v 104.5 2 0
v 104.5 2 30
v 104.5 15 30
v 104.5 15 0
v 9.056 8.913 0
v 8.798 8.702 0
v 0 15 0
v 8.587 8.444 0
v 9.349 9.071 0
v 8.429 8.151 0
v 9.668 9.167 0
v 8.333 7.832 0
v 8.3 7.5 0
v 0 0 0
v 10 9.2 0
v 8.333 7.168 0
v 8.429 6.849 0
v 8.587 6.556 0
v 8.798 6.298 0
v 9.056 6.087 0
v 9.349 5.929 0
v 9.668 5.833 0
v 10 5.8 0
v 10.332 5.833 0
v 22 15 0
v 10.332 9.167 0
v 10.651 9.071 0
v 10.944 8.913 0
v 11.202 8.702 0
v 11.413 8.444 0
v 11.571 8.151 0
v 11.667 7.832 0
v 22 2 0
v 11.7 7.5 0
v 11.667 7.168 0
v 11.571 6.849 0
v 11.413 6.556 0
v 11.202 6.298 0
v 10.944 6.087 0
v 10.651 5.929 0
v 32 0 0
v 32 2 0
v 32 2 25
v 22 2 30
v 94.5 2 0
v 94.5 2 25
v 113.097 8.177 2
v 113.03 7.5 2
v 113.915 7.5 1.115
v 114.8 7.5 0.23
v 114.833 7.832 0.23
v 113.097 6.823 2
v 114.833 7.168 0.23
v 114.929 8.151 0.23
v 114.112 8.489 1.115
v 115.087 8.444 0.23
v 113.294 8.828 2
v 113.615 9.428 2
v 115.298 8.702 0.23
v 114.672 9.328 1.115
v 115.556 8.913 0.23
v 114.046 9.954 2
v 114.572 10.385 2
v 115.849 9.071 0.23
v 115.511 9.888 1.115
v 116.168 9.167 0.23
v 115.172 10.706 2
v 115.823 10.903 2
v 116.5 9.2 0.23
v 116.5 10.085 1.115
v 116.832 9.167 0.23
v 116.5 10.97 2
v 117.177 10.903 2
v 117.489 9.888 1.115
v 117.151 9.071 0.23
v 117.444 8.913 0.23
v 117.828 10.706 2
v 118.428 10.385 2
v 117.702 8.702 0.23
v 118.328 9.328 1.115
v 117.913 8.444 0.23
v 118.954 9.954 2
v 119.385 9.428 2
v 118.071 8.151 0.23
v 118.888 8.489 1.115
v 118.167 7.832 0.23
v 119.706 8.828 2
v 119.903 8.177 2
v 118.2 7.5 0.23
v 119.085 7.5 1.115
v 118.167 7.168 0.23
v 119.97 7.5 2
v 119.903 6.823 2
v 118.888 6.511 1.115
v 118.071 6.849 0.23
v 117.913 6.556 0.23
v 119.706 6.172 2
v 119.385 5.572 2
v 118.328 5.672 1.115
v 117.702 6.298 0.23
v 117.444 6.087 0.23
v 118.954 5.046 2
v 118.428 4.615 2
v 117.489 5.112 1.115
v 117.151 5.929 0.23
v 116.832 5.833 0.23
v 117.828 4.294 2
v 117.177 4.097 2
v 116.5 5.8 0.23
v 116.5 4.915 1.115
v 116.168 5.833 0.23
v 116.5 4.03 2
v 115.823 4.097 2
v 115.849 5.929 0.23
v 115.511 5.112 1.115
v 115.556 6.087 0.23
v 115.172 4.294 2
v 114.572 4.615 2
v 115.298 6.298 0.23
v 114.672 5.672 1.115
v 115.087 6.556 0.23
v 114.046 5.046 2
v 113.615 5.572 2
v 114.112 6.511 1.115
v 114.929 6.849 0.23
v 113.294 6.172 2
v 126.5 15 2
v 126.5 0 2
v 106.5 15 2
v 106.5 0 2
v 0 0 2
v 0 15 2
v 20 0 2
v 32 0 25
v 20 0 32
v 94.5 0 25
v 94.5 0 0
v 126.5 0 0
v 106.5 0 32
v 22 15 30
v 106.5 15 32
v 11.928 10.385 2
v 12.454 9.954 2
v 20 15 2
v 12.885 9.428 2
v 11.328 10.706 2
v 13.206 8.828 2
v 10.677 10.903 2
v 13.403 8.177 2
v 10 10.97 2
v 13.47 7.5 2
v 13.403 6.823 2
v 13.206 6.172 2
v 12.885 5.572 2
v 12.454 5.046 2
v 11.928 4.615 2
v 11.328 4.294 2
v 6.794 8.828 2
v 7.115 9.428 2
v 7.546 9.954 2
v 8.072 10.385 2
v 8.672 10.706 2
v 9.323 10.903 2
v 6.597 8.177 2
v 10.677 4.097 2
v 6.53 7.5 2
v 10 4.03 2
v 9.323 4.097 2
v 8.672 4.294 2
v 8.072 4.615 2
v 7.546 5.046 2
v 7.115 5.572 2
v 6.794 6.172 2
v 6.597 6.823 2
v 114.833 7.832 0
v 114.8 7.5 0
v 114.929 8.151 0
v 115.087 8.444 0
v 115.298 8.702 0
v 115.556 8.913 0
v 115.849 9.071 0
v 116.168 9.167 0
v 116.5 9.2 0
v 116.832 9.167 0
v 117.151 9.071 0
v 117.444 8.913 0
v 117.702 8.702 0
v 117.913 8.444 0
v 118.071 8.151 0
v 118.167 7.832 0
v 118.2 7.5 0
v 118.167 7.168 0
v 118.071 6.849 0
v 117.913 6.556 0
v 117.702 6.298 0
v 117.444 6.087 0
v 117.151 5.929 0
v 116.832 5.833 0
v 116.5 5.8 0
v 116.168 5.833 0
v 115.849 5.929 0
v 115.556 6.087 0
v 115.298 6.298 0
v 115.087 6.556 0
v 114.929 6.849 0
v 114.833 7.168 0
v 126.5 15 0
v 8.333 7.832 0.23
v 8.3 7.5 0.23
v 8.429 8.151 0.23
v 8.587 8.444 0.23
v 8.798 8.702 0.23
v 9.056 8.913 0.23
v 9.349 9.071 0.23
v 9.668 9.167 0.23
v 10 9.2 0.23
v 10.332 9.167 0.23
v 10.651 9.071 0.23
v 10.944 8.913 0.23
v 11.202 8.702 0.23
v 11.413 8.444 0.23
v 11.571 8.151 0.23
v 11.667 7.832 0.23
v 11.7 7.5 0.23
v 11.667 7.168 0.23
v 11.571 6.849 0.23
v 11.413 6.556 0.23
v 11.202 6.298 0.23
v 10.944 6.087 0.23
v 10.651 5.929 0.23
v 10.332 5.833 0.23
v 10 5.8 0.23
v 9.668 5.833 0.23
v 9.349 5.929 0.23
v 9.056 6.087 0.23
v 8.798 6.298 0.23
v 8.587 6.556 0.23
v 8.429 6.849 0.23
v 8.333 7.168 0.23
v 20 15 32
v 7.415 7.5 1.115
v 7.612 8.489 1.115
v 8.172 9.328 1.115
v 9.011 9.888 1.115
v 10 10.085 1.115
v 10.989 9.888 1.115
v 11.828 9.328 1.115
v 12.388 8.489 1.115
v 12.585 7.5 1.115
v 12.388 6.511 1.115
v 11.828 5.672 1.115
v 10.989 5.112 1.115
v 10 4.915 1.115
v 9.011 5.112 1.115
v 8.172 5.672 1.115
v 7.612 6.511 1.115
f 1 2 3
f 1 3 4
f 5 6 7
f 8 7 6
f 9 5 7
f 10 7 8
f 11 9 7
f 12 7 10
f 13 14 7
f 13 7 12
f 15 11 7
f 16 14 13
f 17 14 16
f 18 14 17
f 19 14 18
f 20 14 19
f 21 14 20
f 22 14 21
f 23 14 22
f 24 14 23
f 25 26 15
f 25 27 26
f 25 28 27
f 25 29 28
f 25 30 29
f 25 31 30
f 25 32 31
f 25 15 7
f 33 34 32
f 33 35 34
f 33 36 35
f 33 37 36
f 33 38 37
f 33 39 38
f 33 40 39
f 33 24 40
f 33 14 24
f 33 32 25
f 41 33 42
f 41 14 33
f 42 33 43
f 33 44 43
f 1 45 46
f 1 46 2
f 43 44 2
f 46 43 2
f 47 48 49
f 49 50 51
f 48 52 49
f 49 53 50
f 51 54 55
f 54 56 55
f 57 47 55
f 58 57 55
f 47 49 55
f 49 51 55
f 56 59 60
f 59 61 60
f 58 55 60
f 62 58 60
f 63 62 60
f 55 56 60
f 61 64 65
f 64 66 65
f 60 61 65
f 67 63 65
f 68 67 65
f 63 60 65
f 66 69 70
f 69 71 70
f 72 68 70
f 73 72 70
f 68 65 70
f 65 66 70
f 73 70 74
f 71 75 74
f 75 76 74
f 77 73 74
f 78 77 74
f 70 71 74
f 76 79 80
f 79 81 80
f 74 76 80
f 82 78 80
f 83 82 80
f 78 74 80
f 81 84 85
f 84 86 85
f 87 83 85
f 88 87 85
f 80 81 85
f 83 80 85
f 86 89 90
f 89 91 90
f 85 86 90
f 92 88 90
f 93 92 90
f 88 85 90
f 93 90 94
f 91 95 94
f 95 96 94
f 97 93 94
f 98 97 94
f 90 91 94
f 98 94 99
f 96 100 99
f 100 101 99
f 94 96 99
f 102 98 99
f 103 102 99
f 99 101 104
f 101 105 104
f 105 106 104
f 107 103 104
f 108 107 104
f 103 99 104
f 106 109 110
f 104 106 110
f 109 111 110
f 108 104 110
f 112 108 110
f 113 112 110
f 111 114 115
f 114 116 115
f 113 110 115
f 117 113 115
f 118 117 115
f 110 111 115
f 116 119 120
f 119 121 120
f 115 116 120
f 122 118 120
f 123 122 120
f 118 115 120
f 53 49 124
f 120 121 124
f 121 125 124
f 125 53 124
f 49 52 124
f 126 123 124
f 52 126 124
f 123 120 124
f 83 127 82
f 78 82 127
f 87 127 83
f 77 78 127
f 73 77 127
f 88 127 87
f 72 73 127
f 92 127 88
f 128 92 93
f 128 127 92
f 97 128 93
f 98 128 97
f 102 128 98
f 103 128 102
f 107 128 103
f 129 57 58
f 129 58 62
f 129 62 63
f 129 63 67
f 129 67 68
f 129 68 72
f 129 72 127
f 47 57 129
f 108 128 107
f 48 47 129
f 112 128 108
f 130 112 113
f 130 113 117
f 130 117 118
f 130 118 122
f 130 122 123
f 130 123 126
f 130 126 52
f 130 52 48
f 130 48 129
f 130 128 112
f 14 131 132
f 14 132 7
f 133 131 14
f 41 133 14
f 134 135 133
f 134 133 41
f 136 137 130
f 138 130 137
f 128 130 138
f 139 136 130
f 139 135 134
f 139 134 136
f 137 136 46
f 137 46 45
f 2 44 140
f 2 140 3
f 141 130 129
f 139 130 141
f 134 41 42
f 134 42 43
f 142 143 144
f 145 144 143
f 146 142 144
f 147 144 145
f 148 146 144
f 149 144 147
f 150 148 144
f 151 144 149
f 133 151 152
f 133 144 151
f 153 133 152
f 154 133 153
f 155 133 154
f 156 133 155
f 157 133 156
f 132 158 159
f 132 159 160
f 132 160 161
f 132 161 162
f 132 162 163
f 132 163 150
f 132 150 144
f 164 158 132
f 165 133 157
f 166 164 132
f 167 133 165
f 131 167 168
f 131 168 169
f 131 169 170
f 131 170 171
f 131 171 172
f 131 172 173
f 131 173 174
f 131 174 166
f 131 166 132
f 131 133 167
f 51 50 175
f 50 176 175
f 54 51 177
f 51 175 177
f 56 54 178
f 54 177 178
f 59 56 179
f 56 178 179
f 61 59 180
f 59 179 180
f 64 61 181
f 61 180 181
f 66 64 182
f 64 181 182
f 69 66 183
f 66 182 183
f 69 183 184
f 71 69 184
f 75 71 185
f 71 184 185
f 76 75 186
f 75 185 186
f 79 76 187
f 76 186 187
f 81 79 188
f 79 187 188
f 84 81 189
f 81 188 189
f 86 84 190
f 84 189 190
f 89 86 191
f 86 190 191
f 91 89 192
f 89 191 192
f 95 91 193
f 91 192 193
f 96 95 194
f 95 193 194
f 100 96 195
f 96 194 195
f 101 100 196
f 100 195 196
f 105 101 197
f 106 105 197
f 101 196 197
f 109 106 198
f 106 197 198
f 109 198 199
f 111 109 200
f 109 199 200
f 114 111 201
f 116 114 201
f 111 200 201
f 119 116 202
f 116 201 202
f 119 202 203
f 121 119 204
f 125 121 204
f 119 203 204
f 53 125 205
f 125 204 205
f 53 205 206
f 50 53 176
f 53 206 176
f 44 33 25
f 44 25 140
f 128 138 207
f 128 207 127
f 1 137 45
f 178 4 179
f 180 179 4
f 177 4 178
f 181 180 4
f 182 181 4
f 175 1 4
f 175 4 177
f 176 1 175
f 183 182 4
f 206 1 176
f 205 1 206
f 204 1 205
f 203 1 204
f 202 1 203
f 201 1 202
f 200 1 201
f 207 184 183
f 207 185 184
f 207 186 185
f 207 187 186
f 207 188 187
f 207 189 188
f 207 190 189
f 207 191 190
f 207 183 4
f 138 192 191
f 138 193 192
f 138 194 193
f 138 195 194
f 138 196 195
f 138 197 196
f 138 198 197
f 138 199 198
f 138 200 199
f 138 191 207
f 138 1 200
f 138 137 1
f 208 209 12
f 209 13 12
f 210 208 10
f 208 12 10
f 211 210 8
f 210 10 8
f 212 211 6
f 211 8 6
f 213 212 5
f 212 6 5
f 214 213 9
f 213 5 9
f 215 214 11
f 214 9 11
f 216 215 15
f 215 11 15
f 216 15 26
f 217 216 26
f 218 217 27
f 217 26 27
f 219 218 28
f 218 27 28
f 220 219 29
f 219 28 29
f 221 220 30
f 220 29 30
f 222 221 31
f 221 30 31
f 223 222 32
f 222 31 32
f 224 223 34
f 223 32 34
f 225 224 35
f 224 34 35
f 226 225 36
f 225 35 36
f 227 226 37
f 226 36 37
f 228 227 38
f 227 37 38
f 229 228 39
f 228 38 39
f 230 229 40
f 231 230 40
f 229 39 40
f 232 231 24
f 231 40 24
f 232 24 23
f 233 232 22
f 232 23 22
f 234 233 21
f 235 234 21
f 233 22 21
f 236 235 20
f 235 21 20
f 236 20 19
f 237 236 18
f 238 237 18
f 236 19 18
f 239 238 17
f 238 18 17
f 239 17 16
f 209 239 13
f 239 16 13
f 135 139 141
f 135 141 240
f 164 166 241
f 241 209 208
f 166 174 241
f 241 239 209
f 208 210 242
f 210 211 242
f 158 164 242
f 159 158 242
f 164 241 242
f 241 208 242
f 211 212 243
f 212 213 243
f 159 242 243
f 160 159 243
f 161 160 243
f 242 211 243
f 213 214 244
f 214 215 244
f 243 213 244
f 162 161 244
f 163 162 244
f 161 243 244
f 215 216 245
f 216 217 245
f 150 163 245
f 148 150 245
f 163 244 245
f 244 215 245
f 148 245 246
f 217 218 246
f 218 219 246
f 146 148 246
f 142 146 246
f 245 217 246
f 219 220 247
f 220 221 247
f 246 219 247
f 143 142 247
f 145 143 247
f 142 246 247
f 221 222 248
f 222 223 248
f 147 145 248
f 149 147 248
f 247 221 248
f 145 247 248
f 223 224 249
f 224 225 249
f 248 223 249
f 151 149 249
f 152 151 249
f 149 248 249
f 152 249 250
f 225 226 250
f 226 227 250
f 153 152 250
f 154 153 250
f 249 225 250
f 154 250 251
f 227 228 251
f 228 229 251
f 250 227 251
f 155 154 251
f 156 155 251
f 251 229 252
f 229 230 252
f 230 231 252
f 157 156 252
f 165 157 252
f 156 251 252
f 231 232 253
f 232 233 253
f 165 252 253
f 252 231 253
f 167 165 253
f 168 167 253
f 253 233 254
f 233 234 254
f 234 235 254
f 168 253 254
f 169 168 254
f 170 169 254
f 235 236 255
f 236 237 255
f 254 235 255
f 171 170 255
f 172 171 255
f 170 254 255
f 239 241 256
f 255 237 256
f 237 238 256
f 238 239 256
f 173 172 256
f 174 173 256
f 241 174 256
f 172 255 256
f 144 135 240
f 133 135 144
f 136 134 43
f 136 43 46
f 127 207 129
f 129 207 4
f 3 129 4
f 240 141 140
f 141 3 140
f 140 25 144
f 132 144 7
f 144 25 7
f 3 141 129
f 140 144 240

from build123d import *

# Parameters (mm, degrees)
AUFSATZ_LINEAR_AUSTRAGEN1_DEPTH                      = 15
AUFSATZ_LINEAR_AUSTRAGEN2_DEPTH                      = 2
FORMSENKUNG_F_R_M3_SENKSCHRAUBE_MIT_INNE_D           = 3.4
FORMSENKUNG_F_R_M3_SENKSCHRAUBE_MIT_INNE_DEPTH       = 10
FORMSENKUNG_F_R_M3_SENKSCHRAUBE_MIT_INNE_CSINK_D     = 6.94
FORMSENKUNG_F_R_M3_SENKSCHRAUBE_MIT_INNE_CSINK_ANGLE = 90
FORMSENKUNG_F_R_M3_SENKSCHRAUBE_MIT_INNE_TIP         = 1.021463052


with BuildPart() as part:
    # Skizze1 → Aufsatz-Linear austragen1 (new body)
    with BuildSketch(Plane(origin=(0, 0, 0), x_dir=(1, 0, 0), z_dir=(0, 1, 0))):
        Polygon((0, 0), (22, 0), (22, -30), (104.5, -30), (104.5, 0), (126.5, 0), (126.5, -2), (106.5, -2), (106.5, -32), (20, -32), (20, -2), (0, -2), align=None)
    extrude(amount=AUFSATZ_LINEAR_AUSTRAGEN1_DEPTH)

    # Skizze2 → Aufsatz-Linear austragen2 (add)
    with BuildSketch(Plane.XZ):
        Polygon((22, 0), (32, 0), (32, 25), (94.5, 25), (94.5, 0), (104.5, 0), (104.5, 30), (22, 30), align=None)
    extrude(amount=-AUFSATZ_LINEAR_AUSTRAGEN2_DEPTH)

    # Formsenkung für M3 Senkschraube mit Innensechskant1
    with Locations(Plane.XY.offset(2)):
        with Locations((10, 7.5), (116.5, 7.5)):
            CounterSinkHole(FORMSENKUNG_F_R_M3_SENKSCHRAUBE_MIT_INNE_D / 2, FORMSENKUNG_F_R_M3_SENKSCHRAUBE_MIT_INNE_CSINK_D / 2, depth=FORMSENKUNG_F_R_M3_SENKSCHRAUBE_MIT_INNE_DEPTH, counter_sink_angle=FORMSENKUNG_F_R_M3_SENKSCHRAUBE_MIT_INNE_CSINK_ANGLE)
            with Locations((0, 0, -(FORMSENKUNG_F_R_M3_SENKSCHRAUBE_MIT_INNE_DEPTH + FORMSENKUNG_F_R_M3_SENKSCHRAUBE_MIT_INNE_TIP / 2))):  # 118° drill point
                Cone(0, FORMSENKUNG_F_R_M3_SENKSCHRAUBE_MIT_INNE_D / 2, FORMSENKUNG_F_R_M3_SENKSCHRAUBE_MIT_INNE_TIP, mode=Mode.SUBTRACT)


solid = part.part
